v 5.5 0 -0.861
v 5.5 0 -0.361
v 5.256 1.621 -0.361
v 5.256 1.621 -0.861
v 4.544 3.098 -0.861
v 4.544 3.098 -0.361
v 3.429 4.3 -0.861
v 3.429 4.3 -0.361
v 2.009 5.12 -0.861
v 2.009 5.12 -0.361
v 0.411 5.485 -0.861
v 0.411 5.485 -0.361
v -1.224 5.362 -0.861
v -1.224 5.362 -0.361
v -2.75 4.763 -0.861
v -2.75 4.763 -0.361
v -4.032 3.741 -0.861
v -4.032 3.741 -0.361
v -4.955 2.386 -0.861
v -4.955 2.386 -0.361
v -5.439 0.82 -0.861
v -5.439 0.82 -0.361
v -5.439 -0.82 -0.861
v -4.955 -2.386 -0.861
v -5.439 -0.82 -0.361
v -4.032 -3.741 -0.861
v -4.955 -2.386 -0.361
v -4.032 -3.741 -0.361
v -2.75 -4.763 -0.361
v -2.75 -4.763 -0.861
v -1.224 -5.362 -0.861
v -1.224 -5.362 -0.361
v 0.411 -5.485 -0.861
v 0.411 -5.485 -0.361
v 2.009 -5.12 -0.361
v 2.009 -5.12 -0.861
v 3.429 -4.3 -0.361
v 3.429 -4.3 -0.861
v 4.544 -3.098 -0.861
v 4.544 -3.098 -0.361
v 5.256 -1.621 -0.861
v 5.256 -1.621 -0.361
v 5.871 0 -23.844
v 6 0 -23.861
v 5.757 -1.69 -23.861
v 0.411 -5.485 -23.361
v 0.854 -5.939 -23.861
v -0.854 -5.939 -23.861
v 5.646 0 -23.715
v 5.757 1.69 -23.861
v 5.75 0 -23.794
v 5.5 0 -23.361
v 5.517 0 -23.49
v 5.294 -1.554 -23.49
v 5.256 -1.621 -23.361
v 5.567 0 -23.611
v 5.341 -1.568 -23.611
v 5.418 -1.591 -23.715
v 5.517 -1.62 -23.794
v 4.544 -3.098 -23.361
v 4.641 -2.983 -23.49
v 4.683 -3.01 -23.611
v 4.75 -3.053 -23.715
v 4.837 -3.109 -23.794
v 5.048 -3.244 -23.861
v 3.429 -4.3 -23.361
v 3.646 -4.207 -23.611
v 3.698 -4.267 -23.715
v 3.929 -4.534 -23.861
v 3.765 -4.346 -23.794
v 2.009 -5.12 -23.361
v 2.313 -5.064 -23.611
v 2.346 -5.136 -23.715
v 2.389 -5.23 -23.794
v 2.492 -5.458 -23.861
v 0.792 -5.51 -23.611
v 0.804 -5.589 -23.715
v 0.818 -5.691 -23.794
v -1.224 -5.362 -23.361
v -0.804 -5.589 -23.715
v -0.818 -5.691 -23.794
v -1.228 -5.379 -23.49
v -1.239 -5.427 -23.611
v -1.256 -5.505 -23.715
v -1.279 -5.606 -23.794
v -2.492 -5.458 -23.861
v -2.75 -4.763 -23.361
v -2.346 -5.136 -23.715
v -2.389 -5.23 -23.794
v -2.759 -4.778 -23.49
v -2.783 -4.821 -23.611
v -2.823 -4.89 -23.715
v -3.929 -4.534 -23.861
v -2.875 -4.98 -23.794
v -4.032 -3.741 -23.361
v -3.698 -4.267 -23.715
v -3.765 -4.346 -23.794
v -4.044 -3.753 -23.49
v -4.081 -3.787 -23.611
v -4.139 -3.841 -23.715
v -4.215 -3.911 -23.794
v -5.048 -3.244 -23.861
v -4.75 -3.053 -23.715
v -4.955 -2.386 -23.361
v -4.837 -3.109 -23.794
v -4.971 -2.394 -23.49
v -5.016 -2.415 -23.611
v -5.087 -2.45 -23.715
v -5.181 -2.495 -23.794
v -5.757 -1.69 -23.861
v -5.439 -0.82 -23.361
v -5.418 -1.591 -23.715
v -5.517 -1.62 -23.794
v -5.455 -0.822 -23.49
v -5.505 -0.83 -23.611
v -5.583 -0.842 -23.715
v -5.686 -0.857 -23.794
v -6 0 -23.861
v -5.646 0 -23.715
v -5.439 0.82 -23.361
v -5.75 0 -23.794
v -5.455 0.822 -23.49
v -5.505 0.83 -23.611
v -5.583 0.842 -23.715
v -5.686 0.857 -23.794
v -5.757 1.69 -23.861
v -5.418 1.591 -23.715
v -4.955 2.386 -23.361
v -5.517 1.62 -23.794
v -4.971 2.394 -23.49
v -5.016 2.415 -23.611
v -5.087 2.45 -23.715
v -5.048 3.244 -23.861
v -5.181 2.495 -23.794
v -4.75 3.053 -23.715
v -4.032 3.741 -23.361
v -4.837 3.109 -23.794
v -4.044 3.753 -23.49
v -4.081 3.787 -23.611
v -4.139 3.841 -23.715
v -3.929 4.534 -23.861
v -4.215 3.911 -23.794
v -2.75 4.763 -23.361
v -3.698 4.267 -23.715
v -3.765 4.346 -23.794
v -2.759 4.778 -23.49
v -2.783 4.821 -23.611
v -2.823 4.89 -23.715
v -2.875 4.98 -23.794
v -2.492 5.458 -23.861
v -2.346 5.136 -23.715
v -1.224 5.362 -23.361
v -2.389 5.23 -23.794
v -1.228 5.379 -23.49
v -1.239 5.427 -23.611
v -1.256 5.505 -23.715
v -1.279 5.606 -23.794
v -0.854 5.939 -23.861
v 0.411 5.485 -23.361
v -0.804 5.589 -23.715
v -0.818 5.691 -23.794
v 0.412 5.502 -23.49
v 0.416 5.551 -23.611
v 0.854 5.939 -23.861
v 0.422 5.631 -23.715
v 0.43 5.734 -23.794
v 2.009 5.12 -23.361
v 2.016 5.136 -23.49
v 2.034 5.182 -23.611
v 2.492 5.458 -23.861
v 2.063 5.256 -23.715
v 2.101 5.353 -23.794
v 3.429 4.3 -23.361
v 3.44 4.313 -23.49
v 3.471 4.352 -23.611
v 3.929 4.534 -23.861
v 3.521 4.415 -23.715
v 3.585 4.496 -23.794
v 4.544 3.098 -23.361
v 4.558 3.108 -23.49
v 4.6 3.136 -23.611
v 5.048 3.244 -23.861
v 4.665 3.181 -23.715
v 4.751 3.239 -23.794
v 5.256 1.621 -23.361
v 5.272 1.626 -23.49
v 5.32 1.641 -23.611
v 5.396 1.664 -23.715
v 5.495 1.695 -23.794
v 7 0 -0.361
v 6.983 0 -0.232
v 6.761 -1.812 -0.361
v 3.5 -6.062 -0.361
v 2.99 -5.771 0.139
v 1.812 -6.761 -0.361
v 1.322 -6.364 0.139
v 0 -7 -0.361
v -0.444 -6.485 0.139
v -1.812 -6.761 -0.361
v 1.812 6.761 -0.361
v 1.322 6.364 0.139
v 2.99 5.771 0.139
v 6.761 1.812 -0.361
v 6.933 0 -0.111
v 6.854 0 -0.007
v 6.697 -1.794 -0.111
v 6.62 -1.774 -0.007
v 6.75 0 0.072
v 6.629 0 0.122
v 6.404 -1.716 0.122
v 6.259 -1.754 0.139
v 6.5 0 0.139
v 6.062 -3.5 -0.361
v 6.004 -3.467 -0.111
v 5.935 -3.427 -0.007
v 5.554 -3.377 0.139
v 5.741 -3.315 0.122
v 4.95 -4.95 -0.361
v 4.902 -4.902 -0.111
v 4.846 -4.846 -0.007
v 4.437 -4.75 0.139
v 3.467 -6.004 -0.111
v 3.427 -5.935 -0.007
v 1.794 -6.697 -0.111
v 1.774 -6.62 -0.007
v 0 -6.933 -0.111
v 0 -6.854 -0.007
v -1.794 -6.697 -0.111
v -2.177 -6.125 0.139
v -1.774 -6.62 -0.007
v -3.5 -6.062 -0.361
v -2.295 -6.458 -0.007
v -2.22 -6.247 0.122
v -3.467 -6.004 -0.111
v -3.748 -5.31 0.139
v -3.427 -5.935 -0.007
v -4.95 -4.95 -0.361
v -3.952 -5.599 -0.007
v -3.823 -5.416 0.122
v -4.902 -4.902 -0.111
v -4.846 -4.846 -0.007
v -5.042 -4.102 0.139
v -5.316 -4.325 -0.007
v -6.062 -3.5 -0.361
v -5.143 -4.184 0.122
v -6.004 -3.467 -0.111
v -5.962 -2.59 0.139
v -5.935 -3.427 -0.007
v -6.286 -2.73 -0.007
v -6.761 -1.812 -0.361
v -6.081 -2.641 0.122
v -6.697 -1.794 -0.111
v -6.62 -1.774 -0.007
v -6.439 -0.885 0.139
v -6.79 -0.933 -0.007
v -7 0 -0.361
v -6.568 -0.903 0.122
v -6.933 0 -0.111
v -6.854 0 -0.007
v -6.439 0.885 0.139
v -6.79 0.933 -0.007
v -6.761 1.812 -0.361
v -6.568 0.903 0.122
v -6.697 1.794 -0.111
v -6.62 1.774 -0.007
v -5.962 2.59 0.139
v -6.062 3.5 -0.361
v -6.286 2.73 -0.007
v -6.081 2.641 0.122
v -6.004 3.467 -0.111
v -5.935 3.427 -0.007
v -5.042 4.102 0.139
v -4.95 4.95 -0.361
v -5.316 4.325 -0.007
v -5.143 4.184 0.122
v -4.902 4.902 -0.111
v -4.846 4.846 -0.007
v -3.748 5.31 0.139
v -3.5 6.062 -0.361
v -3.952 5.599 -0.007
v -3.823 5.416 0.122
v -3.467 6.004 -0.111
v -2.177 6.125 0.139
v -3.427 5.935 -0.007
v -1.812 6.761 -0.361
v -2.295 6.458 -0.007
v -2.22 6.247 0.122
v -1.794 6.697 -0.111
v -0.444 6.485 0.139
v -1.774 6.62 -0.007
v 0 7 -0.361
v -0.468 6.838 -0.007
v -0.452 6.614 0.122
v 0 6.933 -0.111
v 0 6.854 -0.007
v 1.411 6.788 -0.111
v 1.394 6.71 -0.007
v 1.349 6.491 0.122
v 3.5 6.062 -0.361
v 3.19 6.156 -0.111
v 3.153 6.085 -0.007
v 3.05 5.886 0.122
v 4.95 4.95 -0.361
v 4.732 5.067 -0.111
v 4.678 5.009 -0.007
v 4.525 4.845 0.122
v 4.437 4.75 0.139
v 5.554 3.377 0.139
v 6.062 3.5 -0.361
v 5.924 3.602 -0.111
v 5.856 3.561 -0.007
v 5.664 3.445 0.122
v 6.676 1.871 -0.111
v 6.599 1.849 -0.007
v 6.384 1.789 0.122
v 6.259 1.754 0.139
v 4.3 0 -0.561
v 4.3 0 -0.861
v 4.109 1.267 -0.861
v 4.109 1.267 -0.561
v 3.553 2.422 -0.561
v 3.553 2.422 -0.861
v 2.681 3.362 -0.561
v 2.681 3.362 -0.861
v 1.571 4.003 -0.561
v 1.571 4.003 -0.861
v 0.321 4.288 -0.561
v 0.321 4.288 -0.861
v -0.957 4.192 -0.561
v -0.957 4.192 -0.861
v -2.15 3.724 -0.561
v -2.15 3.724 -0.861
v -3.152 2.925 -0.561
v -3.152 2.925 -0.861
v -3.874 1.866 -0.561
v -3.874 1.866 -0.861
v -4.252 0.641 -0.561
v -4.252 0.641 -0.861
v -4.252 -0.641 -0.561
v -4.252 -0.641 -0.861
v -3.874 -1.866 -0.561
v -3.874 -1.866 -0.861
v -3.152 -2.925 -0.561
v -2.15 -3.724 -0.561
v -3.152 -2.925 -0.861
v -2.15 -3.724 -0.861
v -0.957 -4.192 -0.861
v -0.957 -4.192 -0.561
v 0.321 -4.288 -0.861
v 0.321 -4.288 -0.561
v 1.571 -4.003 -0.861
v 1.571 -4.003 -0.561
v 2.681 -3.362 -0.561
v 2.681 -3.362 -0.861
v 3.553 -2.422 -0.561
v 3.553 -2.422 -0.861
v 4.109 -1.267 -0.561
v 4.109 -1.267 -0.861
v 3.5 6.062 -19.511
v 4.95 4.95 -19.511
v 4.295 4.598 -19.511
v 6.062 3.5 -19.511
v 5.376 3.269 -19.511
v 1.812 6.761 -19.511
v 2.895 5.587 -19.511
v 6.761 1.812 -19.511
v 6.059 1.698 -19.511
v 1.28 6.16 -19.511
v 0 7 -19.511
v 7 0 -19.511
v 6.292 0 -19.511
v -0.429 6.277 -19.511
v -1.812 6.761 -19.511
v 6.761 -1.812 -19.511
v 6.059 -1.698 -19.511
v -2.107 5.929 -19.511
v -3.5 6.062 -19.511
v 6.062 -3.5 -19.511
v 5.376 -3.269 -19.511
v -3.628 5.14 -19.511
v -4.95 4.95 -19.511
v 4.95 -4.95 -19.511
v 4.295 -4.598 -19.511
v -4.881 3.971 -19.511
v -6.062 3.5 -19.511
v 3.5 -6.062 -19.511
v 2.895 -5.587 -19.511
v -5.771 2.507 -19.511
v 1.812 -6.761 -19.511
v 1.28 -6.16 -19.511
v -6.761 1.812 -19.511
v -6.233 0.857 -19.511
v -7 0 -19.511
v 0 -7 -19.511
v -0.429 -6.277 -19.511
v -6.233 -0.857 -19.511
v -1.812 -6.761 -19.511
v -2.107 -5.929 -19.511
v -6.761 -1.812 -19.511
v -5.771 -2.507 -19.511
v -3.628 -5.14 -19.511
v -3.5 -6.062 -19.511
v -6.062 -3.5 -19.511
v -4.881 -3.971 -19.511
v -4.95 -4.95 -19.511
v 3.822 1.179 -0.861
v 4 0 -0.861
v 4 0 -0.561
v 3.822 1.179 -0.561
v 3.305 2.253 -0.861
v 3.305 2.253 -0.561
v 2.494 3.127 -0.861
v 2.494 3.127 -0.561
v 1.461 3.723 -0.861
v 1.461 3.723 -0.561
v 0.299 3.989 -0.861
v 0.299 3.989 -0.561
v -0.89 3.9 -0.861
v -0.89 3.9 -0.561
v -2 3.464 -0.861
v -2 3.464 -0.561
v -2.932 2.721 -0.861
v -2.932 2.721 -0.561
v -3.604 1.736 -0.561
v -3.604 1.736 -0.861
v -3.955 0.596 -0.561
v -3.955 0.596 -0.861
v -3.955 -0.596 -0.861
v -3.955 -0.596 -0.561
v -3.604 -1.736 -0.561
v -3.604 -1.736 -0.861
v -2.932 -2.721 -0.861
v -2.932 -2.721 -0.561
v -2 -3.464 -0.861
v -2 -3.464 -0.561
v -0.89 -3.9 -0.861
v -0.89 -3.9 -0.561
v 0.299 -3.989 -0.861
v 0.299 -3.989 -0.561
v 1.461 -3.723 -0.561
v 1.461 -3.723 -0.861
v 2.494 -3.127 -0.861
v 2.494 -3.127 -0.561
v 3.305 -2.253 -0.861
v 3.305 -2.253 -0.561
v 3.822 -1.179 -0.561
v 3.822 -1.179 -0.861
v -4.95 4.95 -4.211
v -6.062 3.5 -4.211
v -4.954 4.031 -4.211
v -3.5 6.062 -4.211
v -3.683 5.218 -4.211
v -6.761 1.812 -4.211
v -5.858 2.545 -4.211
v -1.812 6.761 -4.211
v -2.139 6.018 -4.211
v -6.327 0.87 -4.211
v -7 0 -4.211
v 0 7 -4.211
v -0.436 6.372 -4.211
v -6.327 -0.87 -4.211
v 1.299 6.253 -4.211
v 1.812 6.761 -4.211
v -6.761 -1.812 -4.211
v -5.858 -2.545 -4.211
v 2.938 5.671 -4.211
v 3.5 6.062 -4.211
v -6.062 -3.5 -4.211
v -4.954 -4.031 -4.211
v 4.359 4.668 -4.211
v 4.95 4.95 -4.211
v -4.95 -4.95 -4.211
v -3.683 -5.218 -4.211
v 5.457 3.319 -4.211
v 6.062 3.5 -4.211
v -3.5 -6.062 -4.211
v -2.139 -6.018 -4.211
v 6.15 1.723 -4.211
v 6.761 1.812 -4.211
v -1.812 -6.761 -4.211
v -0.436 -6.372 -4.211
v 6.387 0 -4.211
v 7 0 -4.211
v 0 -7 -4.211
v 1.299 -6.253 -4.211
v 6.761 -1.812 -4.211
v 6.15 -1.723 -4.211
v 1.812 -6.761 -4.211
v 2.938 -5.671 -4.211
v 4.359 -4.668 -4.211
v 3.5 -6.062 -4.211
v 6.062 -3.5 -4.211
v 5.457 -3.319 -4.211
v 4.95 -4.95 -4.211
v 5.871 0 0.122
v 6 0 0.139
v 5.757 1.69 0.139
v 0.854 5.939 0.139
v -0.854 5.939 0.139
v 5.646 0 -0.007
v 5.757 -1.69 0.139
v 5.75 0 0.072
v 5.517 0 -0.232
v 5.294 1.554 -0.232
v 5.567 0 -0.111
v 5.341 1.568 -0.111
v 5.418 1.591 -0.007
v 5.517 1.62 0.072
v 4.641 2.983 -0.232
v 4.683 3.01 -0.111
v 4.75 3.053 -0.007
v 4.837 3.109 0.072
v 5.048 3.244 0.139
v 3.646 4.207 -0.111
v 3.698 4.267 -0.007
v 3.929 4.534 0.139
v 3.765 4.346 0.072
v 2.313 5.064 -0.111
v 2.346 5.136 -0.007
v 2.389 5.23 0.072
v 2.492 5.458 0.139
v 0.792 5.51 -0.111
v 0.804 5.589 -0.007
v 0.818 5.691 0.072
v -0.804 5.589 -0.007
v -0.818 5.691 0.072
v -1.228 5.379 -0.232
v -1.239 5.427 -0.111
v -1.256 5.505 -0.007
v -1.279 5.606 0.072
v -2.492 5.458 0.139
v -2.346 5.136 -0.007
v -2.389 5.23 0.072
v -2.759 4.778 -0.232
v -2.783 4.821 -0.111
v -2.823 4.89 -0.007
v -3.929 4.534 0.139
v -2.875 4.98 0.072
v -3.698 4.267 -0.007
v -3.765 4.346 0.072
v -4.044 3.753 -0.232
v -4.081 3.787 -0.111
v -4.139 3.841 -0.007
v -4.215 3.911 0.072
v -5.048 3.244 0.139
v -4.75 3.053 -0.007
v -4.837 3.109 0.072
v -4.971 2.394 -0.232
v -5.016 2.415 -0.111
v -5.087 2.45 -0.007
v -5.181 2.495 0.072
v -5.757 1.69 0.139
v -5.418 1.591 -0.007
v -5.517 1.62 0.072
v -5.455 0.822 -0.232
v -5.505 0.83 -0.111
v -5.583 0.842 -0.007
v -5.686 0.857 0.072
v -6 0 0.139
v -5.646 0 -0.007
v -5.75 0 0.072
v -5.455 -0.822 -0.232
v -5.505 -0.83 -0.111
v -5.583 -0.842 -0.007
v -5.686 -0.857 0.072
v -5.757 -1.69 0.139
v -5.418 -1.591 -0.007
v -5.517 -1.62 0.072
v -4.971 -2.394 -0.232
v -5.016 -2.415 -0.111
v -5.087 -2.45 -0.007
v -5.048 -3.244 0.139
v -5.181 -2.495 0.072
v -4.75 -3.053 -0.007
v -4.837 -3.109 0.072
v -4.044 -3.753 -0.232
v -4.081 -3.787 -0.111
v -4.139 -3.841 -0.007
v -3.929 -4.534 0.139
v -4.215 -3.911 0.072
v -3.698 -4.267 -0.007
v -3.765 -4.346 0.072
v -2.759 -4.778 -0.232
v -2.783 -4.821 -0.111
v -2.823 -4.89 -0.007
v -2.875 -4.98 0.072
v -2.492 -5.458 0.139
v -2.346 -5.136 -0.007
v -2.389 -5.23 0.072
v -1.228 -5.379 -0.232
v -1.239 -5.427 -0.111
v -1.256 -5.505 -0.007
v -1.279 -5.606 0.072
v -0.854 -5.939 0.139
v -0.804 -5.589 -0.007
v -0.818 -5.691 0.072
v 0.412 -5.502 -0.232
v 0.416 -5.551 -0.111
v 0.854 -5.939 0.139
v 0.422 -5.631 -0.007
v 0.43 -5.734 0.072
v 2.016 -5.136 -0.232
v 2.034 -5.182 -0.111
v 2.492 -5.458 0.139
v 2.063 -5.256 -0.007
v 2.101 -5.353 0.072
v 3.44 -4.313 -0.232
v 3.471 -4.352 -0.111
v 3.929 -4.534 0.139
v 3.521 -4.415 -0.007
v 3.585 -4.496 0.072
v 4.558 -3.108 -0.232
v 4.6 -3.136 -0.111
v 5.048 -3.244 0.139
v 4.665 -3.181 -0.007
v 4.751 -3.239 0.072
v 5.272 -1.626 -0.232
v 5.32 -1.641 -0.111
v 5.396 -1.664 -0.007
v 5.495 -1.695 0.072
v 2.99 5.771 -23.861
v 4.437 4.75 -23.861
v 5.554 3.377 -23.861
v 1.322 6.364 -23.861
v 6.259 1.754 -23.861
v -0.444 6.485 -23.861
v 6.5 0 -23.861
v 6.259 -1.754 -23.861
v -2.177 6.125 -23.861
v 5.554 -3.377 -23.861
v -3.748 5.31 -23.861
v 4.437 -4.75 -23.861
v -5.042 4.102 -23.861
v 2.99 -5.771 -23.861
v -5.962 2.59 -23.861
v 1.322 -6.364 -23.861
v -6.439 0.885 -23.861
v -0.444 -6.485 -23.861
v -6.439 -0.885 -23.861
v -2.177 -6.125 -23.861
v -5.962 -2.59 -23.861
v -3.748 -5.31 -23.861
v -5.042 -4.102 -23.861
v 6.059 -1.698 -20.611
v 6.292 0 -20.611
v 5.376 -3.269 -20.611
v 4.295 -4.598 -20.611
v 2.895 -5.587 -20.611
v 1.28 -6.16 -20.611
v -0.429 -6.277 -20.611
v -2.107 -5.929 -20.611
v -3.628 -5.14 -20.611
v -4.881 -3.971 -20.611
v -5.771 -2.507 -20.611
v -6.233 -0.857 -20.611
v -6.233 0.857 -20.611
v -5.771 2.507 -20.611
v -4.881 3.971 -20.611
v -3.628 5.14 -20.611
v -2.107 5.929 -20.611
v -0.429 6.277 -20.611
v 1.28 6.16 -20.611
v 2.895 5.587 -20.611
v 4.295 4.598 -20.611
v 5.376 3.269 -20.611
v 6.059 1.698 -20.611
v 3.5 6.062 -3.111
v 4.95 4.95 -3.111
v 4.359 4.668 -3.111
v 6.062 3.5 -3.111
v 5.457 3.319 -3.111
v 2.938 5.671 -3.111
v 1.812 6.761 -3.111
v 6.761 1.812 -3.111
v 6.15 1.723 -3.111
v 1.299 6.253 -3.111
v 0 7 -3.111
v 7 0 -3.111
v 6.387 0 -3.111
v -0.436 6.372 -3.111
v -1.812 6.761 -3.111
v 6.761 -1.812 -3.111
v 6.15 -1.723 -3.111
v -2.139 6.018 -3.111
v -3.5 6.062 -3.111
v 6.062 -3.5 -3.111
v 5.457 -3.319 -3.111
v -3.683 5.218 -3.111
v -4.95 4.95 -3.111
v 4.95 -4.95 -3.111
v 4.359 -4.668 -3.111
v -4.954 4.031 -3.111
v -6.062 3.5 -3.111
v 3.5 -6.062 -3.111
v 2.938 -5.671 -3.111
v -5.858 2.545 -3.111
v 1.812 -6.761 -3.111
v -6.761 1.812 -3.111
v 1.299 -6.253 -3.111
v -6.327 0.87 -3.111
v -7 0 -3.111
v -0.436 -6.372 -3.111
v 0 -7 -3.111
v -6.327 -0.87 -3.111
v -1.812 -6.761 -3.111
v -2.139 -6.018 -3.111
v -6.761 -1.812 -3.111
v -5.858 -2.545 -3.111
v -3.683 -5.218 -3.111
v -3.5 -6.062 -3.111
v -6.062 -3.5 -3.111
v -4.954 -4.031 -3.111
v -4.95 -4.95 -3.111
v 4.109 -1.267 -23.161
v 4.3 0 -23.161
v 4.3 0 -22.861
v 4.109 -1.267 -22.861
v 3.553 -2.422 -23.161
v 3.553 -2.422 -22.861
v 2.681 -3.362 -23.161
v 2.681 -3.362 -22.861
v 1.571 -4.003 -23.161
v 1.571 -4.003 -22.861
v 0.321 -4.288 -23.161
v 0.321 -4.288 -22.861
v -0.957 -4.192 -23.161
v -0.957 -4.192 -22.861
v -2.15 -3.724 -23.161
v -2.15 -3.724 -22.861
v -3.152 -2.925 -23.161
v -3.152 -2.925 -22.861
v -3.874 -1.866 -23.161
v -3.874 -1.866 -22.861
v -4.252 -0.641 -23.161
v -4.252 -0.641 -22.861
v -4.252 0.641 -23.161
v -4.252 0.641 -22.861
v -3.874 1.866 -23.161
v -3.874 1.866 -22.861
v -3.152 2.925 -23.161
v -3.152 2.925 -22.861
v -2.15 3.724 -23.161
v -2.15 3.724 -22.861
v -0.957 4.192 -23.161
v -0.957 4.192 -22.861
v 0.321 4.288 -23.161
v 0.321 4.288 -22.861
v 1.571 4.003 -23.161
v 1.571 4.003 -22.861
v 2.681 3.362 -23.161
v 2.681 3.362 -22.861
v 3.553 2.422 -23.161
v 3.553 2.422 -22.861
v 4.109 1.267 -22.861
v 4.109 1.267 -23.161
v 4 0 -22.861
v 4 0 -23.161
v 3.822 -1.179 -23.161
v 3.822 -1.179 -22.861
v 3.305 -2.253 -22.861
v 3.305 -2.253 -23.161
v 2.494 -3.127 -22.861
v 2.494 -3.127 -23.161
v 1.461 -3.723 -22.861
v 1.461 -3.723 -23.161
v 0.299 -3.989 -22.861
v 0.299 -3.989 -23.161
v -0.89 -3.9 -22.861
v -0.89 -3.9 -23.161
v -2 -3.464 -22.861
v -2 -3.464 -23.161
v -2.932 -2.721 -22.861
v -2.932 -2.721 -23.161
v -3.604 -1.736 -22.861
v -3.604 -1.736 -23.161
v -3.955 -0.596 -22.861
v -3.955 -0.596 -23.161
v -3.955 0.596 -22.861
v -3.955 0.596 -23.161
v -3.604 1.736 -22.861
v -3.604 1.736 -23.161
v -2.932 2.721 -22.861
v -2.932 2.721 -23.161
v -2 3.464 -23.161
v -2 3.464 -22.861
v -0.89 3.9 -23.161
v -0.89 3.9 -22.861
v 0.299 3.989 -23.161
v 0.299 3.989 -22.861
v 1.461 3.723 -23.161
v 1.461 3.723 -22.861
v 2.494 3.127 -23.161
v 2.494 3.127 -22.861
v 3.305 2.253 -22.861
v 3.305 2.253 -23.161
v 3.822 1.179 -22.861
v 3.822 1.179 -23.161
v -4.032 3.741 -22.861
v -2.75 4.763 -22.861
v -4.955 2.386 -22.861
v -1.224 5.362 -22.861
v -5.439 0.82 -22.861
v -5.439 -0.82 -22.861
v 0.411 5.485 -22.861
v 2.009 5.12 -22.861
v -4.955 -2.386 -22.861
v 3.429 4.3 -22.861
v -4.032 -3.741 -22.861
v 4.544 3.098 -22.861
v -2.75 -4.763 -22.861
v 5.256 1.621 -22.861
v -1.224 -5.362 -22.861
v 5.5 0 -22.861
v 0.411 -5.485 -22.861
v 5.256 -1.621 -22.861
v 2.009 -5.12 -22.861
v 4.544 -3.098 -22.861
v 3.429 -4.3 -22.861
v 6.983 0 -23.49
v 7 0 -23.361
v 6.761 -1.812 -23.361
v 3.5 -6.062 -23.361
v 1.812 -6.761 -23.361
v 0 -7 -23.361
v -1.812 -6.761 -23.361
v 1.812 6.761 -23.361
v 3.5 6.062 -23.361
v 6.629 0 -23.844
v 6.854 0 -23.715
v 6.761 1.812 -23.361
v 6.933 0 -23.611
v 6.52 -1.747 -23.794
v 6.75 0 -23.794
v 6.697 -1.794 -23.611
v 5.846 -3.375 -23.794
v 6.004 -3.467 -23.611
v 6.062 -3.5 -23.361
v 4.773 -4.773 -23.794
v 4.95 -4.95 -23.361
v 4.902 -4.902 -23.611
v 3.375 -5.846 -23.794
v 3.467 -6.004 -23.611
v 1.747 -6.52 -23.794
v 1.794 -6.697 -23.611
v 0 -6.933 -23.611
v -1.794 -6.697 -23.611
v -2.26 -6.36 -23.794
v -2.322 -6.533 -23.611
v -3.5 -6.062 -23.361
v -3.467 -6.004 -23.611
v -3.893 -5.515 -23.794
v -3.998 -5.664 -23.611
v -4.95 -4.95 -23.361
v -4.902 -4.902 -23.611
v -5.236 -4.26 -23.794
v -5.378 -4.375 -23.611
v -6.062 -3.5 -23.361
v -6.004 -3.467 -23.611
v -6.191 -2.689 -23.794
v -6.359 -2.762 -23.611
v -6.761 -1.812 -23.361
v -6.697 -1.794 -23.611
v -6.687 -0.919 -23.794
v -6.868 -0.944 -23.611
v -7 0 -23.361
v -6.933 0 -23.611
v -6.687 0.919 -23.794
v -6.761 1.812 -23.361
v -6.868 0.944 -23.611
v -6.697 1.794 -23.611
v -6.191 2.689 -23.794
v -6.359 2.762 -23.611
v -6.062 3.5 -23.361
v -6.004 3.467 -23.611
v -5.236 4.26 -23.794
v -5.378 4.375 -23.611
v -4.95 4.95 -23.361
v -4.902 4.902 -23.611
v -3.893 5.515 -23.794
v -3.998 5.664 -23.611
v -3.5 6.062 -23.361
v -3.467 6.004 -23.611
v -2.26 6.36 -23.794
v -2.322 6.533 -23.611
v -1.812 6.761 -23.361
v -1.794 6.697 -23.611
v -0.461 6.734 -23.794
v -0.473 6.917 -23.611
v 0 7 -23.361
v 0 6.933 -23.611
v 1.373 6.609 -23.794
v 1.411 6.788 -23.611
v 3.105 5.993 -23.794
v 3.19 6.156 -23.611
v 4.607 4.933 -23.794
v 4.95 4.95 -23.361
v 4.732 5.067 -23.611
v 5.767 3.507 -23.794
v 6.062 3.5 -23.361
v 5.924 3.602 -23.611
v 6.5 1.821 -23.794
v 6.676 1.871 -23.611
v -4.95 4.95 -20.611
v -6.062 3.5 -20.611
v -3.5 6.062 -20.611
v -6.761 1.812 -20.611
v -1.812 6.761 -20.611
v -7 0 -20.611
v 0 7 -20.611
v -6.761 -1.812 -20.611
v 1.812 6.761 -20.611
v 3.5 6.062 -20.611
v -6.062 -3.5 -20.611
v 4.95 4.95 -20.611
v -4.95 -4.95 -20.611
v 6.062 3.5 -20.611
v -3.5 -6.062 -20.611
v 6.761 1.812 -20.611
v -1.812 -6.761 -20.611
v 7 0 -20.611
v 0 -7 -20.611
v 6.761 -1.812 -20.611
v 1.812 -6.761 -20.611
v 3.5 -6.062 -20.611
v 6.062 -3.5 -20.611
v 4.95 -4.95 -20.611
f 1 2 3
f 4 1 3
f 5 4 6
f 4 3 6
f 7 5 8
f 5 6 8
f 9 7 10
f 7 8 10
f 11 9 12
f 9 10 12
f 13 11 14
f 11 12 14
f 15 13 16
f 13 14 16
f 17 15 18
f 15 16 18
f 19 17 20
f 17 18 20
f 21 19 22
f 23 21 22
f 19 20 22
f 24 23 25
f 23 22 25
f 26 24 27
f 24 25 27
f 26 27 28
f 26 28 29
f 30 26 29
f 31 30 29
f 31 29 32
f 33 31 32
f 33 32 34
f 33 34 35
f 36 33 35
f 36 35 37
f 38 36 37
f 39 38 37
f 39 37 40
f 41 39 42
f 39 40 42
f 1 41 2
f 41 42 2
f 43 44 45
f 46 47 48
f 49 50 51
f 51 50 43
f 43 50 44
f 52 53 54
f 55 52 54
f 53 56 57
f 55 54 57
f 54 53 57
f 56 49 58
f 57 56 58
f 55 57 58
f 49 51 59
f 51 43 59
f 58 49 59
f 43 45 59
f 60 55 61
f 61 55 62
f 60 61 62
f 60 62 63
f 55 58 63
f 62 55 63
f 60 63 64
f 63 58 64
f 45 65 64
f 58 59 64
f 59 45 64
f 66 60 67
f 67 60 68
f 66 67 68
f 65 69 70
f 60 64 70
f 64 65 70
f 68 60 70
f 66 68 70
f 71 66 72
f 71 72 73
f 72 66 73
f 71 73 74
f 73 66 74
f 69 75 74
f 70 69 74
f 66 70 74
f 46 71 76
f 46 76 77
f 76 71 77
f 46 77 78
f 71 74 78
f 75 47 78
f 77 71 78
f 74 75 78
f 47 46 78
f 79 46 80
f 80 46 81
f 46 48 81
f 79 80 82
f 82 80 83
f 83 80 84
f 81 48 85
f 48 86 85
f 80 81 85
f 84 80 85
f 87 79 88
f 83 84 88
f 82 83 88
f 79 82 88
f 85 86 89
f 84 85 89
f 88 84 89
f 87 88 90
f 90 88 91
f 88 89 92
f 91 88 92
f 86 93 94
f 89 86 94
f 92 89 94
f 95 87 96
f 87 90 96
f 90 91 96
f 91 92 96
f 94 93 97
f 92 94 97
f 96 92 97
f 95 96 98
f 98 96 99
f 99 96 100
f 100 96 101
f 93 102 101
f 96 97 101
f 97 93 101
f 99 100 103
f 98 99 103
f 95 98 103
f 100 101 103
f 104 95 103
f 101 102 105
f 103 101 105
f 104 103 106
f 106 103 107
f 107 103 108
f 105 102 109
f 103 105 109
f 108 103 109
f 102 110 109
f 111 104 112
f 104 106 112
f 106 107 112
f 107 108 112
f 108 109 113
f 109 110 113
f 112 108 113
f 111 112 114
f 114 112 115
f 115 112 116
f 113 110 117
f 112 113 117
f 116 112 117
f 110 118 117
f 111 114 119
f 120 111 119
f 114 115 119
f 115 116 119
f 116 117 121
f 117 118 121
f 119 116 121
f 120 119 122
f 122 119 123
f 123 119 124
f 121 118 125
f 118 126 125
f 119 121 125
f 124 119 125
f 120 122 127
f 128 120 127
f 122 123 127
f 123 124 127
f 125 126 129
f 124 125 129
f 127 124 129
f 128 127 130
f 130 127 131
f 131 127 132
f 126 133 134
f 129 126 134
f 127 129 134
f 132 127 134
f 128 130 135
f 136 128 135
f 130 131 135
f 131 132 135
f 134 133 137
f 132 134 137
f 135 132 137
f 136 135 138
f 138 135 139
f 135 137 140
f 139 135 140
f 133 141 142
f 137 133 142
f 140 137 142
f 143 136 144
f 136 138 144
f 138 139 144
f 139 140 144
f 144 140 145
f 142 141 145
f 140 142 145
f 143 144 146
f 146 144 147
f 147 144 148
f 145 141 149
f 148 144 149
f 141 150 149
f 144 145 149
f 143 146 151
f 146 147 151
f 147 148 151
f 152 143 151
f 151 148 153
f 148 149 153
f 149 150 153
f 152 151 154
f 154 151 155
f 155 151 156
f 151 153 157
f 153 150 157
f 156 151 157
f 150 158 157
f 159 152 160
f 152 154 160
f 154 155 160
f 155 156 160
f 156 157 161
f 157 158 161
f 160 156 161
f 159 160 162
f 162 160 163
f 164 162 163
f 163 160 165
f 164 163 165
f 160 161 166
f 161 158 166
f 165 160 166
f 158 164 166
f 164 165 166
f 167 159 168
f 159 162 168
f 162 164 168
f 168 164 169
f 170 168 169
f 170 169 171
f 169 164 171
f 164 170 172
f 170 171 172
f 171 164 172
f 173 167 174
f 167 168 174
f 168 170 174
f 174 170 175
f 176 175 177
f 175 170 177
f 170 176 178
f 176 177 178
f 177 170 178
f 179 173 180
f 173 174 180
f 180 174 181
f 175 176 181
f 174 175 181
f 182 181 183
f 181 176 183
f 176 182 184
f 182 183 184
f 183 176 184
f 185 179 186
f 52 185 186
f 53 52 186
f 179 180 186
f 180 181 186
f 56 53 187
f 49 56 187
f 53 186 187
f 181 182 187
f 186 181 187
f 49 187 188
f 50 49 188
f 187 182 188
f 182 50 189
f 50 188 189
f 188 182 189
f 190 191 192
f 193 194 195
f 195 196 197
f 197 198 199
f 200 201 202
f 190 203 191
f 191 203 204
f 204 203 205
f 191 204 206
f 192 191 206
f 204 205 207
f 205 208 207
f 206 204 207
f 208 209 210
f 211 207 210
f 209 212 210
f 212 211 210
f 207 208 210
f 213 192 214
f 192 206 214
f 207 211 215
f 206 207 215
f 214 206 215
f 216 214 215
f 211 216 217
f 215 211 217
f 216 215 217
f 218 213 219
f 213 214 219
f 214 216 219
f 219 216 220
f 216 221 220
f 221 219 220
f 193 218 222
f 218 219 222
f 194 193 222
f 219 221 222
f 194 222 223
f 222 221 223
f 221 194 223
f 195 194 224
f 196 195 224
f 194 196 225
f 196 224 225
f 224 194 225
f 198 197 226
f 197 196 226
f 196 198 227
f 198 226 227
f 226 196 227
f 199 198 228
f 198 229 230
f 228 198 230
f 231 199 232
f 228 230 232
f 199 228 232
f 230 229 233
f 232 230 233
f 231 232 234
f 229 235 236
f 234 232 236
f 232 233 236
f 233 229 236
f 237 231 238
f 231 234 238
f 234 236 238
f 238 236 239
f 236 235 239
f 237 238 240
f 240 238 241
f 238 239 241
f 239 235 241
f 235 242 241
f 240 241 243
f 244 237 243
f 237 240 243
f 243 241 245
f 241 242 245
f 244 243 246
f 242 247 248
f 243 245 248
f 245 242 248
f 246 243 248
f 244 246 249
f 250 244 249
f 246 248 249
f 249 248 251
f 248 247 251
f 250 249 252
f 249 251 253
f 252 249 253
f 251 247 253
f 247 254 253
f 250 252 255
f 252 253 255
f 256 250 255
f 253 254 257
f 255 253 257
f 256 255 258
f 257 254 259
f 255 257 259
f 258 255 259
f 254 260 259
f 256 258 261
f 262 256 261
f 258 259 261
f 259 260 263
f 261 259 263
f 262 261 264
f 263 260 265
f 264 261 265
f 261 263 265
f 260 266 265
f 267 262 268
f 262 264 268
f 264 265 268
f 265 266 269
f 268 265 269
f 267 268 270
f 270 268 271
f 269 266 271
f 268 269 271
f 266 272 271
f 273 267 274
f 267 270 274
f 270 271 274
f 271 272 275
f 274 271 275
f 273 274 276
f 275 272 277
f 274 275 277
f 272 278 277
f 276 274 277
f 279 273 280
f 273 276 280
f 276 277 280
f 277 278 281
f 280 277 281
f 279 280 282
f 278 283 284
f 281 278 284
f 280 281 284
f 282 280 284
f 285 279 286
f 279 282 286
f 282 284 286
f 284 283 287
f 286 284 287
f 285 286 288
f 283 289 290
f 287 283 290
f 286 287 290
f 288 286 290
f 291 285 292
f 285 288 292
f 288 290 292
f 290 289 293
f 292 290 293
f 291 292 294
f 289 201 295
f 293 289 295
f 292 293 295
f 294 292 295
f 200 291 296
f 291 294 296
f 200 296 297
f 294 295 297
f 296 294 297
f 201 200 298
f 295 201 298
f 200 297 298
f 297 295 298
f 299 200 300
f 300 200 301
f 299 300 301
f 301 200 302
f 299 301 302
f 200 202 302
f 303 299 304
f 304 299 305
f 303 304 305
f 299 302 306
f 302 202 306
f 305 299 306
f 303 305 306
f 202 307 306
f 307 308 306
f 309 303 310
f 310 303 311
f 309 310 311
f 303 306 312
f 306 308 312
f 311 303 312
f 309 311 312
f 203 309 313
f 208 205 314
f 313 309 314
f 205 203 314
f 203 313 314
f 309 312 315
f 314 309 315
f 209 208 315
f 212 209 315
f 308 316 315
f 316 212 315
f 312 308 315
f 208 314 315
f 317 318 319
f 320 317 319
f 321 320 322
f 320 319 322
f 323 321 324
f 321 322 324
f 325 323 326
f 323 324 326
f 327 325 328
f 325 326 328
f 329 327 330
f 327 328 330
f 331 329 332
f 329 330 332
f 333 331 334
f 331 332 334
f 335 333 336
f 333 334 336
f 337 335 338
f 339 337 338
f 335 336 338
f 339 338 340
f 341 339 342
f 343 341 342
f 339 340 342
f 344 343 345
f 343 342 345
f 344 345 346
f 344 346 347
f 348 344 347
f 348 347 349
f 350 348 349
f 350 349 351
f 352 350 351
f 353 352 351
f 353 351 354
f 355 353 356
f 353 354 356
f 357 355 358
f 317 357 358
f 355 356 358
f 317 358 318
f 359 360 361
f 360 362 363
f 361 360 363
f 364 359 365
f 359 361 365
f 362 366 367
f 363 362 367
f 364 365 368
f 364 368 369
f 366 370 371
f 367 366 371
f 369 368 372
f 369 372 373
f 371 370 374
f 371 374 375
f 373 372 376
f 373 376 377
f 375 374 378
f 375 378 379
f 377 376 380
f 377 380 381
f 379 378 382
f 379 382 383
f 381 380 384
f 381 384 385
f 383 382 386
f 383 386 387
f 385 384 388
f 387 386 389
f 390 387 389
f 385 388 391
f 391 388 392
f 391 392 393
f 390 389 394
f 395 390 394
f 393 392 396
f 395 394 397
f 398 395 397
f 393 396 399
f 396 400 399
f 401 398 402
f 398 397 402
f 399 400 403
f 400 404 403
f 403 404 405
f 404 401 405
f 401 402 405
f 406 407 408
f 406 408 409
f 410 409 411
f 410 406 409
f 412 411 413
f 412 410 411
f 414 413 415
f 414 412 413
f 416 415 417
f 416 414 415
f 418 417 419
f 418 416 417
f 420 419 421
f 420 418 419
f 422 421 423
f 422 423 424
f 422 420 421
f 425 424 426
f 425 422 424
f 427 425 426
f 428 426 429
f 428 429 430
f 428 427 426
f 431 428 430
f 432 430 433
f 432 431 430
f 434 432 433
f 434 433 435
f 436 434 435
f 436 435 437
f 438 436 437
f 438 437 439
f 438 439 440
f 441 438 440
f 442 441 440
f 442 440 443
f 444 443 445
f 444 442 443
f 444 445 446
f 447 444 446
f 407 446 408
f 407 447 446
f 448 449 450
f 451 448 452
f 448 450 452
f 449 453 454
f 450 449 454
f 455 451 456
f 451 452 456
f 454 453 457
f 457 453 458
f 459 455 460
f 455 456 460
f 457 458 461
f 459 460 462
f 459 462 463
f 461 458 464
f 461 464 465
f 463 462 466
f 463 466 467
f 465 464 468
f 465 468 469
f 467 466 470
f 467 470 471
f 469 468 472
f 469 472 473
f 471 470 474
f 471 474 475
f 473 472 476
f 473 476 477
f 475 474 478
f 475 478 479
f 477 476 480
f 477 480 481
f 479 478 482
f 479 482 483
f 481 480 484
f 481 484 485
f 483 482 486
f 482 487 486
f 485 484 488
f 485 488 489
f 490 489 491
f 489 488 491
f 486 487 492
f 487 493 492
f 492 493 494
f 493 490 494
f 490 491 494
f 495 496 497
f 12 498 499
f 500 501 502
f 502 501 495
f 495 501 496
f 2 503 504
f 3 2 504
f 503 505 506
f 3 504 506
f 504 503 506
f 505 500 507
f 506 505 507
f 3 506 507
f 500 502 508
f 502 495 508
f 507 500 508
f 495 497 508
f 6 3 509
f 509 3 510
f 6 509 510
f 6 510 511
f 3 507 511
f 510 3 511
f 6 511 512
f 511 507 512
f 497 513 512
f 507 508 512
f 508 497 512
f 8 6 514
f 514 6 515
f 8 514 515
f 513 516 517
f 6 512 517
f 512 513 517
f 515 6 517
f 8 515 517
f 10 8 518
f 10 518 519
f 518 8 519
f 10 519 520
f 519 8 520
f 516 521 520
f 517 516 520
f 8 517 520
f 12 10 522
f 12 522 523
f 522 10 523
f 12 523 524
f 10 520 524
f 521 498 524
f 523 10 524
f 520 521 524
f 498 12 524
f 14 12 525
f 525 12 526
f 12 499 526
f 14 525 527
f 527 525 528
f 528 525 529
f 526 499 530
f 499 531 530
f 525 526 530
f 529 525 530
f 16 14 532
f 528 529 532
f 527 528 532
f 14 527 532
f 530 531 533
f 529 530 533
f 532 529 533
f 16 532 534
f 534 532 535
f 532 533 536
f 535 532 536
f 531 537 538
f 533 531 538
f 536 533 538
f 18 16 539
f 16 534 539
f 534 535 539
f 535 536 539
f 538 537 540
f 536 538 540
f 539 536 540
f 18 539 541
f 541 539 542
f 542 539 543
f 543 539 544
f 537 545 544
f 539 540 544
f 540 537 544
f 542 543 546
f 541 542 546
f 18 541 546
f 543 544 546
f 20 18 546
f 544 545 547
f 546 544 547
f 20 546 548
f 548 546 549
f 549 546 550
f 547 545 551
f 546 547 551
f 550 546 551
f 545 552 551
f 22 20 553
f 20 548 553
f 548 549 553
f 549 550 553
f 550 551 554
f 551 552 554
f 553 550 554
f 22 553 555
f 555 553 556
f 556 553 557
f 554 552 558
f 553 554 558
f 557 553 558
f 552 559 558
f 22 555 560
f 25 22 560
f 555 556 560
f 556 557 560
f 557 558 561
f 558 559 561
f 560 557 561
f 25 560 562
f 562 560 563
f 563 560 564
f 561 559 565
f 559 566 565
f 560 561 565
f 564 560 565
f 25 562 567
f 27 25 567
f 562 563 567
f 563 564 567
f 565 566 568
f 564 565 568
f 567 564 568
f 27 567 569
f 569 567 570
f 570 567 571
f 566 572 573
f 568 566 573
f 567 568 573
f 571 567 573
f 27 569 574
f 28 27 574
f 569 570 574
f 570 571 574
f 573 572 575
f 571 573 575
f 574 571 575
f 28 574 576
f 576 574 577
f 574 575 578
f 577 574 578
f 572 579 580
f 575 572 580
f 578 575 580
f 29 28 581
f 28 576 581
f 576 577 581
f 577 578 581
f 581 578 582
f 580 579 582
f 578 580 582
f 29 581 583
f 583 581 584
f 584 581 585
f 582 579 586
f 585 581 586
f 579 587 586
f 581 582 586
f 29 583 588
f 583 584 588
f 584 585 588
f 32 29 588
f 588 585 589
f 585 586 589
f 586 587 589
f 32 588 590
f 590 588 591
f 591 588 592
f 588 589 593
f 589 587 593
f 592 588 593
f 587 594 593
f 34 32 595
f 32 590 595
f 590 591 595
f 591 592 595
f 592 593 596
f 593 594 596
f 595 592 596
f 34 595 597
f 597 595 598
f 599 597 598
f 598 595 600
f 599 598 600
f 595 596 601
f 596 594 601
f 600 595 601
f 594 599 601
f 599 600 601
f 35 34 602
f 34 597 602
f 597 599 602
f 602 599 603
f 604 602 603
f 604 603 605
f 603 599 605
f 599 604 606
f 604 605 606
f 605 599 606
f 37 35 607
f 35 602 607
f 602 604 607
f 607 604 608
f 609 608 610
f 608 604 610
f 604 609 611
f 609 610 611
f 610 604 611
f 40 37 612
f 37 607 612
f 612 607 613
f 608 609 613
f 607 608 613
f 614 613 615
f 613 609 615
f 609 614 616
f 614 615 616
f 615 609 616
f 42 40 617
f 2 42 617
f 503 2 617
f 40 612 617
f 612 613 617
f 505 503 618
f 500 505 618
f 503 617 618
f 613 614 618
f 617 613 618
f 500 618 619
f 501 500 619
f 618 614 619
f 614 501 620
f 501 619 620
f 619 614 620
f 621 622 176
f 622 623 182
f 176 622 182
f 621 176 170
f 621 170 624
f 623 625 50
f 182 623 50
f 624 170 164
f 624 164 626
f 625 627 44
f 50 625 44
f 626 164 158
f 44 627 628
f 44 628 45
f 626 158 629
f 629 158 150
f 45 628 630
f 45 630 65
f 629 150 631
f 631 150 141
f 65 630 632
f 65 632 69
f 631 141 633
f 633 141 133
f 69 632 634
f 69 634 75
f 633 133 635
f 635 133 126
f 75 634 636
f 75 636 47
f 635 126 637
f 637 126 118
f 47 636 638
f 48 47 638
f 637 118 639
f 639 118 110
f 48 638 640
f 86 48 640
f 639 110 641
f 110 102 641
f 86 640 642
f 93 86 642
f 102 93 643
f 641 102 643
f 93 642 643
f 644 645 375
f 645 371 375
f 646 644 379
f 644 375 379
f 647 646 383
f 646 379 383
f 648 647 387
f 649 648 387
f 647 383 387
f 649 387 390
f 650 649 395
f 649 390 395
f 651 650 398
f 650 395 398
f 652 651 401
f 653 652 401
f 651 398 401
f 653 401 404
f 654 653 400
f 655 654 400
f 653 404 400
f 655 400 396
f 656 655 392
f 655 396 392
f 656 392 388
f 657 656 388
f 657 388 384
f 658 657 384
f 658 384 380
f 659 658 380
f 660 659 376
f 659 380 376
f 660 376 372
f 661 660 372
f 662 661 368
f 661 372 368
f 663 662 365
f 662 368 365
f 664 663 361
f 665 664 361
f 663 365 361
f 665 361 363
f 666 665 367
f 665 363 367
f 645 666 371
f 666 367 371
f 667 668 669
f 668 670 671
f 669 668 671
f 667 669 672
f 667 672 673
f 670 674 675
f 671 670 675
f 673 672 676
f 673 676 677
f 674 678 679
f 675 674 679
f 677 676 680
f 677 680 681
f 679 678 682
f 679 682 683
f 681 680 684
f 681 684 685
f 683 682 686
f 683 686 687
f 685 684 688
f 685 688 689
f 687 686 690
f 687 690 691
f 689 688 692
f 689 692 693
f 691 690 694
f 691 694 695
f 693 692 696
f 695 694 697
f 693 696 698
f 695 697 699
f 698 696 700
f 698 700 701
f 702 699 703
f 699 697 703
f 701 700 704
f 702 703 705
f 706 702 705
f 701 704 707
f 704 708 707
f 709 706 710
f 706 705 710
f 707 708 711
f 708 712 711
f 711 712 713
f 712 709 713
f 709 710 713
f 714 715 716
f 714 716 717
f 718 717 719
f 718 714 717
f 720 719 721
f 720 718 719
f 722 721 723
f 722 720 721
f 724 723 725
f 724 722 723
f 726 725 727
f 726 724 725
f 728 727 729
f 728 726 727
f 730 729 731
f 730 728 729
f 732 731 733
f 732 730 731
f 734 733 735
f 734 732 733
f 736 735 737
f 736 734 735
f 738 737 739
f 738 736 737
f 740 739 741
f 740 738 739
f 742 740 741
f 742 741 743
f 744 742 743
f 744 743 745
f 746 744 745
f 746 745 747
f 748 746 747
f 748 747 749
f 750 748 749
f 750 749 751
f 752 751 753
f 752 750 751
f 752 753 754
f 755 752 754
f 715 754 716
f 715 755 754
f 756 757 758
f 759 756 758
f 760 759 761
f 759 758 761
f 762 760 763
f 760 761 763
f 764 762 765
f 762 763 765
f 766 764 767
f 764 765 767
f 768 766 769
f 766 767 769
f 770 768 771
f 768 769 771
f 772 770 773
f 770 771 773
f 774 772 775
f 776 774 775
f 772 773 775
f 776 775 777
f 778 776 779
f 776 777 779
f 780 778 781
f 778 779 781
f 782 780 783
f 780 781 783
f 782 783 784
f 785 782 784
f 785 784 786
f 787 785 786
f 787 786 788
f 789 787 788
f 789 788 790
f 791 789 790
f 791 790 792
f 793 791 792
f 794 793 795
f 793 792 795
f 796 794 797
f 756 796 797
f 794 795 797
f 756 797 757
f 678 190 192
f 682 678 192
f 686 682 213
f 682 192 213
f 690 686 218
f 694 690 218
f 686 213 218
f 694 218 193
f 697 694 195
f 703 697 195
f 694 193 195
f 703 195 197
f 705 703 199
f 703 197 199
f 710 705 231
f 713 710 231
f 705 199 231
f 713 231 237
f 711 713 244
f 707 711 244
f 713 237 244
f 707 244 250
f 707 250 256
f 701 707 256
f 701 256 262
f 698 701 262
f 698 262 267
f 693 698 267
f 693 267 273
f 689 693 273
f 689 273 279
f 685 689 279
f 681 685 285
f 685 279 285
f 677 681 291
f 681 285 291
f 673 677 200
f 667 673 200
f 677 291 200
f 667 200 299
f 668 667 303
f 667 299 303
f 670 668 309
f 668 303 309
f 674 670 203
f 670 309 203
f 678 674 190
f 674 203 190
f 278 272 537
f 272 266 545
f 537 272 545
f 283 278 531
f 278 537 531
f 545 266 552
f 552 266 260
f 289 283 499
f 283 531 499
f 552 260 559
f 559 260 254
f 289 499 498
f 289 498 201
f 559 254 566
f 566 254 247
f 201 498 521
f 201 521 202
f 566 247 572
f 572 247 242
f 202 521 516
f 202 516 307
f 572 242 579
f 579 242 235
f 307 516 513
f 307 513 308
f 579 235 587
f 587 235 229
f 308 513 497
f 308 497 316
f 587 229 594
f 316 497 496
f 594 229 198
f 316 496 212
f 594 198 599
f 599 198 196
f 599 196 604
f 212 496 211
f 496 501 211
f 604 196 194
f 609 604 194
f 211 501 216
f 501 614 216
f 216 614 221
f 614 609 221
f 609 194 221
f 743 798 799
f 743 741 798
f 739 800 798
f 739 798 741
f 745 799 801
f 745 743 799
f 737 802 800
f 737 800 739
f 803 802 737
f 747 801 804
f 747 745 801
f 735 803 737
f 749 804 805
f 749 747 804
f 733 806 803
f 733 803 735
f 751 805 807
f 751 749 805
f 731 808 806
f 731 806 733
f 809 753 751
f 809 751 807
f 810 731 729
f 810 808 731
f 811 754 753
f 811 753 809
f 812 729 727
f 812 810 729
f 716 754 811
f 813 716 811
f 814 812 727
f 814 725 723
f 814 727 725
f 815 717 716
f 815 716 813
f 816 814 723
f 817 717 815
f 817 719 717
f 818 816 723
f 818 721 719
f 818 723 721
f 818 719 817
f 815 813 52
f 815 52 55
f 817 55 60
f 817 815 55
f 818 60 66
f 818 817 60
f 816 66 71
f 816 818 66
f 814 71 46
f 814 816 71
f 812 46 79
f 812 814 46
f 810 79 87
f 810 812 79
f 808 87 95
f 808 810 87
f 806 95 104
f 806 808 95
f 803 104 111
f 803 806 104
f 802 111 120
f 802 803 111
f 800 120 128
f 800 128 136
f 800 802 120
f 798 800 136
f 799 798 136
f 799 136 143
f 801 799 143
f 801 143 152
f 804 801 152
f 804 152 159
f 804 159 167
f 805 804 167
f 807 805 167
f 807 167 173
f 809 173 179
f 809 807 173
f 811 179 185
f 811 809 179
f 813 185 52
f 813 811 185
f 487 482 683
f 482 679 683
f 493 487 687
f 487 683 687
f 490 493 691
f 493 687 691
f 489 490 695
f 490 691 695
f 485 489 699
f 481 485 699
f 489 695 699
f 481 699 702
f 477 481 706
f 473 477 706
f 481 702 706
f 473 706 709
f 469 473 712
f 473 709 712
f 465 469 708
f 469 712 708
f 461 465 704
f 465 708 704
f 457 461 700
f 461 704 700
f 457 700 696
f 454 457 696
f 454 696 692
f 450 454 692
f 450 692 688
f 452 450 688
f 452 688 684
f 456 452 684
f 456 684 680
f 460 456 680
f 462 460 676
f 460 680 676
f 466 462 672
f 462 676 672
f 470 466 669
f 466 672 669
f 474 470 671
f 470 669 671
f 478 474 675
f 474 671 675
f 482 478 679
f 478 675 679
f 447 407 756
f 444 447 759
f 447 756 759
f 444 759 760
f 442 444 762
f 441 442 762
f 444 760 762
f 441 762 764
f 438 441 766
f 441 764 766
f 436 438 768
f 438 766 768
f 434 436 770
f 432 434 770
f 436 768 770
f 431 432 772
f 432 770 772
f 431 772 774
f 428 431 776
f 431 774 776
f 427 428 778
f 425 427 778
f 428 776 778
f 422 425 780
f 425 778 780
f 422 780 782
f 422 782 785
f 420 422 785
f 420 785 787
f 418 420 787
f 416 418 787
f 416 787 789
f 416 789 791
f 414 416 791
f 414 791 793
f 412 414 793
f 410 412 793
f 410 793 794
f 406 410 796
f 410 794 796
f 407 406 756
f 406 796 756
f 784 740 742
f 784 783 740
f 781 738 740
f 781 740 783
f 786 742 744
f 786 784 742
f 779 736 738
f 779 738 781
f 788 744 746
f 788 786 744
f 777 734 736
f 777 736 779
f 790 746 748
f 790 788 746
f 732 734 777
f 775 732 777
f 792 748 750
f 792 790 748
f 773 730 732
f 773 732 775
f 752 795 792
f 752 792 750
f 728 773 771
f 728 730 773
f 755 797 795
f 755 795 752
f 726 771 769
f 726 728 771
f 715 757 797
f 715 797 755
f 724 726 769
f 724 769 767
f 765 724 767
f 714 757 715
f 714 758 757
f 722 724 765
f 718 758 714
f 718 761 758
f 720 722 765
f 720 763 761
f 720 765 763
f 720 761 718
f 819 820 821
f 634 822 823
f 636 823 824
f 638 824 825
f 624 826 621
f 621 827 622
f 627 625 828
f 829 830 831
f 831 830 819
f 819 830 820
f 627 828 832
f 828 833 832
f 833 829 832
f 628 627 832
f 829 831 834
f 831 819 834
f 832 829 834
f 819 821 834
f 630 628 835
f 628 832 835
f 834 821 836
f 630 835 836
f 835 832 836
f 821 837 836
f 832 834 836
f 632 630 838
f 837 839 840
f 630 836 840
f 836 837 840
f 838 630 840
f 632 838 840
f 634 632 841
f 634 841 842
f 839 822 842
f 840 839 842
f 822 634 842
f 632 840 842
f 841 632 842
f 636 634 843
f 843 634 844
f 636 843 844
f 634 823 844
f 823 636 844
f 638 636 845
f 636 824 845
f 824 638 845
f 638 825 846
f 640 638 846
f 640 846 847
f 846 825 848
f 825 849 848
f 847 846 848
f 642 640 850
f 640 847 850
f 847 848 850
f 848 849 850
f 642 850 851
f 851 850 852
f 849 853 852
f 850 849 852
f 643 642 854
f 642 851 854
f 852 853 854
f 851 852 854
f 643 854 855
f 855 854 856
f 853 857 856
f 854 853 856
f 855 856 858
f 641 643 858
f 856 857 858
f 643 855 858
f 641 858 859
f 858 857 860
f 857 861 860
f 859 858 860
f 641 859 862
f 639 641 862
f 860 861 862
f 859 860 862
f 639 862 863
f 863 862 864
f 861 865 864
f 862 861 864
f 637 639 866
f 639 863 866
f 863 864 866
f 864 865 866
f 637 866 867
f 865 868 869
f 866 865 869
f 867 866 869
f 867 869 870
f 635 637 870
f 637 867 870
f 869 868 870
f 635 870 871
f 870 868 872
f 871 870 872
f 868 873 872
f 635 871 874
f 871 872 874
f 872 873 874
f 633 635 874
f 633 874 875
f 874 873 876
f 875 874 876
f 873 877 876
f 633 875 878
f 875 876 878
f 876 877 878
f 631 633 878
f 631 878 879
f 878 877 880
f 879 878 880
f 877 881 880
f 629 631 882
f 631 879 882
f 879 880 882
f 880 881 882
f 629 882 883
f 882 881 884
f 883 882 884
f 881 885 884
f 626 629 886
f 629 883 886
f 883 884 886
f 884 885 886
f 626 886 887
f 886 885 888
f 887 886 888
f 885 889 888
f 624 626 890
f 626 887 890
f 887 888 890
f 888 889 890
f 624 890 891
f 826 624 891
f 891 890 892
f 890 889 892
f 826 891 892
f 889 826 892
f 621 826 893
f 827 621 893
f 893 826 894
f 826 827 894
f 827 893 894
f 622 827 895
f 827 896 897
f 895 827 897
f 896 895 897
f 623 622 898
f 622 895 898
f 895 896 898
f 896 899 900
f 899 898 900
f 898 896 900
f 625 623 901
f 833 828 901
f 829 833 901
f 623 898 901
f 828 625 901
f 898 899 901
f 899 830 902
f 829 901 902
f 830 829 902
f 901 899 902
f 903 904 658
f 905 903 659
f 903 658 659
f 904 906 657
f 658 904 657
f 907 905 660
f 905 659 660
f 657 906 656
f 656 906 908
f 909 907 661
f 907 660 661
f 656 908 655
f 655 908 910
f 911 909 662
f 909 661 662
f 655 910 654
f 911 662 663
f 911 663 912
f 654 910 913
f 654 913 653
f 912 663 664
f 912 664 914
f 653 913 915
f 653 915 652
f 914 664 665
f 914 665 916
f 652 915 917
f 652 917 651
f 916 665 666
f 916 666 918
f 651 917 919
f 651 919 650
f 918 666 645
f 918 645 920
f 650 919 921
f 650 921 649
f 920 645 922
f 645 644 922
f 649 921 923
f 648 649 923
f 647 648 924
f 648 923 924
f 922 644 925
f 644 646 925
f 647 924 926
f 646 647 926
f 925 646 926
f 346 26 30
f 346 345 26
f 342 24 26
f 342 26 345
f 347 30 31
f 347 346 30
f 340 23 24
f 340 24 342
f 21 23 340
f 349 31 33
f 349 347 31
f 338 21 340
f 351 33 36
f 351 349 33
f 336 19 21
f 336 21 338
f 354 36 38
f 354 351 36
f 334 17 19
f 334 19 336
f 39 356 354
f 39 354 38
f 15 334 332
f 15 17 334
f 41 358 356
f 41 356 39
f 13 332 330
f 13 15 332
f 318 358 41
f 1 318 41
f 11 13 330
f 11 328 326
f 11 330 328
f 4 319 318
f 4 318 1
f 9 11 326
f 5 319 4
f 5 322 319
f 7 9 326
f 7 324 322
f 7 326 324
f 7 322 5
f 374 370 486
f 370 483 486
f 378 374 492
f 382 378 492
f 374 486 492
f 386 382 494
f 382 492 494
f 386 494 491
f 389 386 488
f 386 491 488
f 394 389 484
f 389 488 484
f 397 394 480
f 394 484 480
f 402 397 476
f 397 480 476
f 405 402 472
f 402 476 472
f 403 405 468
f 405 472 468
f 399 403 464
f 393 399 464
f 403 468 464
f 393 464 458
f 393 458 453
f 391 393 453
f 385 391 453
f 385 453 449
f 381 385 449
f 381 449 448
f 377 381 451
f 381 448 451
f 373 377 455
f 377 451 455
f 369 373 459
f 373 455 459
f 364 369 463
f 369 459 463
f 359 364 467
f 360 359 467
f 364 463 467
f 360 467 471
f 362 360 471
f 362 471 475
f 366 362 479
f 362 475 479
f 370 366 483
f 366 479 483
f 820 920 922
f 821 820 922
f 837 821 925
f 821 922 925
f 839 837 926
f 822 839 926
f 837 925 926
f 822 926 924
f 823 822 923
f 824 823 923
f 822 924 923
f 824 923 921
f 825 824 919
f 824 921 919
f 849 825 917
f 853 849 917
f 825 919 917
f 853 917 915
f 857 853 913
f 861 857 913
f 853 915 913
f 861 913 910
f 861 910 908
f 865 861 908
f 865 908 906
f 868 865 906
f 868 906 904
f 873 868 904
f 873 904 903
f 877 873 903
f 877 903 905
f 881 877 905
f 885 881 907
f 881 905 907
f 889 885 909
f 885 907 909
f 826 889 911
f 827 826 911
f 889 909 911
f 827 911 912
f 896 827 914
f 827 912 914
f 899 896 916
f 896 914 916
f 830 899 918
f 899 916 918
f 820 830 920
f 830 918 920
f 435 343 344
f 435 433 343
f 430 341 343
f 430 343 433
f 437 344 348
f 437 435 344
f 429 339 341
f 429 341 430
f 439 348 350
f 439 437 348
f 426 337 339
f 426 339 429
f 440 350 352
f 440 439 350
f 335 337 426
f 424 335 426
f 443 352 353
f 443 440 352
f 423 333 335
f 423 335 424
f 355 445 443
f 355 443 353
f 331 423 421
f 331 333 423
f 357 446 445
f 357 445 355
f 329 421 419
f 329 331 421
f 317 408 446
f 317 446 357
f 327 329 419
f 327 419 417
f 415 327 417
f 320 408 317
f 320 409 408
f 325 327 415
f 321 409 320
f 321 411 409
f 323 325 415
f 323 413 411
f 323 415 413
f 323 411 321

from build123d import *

# Parameters (mm, degrees)
FILLET1_R           = 0.5
SKETCH5_R           = 5.5
CUT_EXTRUDE1_DEPTH  = 1
FILLET2_R           = 0.5
CUT_EXTRUDE2_START  = -1
SKETCH6_R           = 5.5
CUT_EXTRUDE2_DEPTH  = 1
FILLET3_R           = 0.5
SKETCH8_R           = 4.3
SKETCH8_R_2         = 4
BOSS_EXTRUDE4_DEPTH = 0.3
BOSS_EXTRUDE5_START = 0.3
SKETCH9_R           = 4.3
SKETCH9_R_2         = 4
BOSS_EXTRUDE5_DEPTH = 0.3


with BuildPart() as part:
    # Sketch4 → Revolve1 (revolve)
    with BuildSketch(Plane(origin=(0, 0, 0), x_dir=(0, 0, -1), z_dir=(1, 0, 0)), mode=Mode.PRIVATE) as revolve1_sk:
        Polygon((-0.139006256, 4), (23.860993744, 4), (23.860993744, 7), (20.610993744, 7), (20.610993744, 6.291984931), (19.510993744, 6.291984931), (19.510993744, 7), (4.210993744, 7), (4.210993744, 6.386905477), (3.110993744, 6.386905477), (3.110993744, 7), (-0.139006256, 7), align=None)
    revolve(revolve1_sk.sketch.rotate(Axis((0, 0, 0), (0, 0, -1)), 90), axis=Axis((0, 0, 0), (0, 0, -1)))

    # Fillet1
    fillet1_edges = [part.edges().sort_by_distance(p)[0] for p in [
        (-7, 0, -23.860993744),
        (-7, 0, 0.139006256),
    ]]
    fillet(fillet1_edges, radius=FILLET1_R)

    # Sketch5 → Cut-Extrude1 (cut)
    with BuildSketch(Plane.XY.offset(0.139006256)):
        Circle(SKETCH5_R)
    extrude(amount=-CUT_EXTRUDE1_DEPTH, mode=Mode.SUBTRACT)

    # Fillet2
    fillet2_edges = [part.edges().sort_by_distance(p)[0] for p in [
        (-5.5, 0, 0.139006256),
    ]]
    fillet(fillet2_edges, radius=FILLET2_R)

    # Sketch6 → Cut-Extrude2 (cut)
    with BuildSketch(Plane(origin=(0, 0, -23.860993744), x_dir=(-1, 0, 0), z_dir=(0, 0, -1)).offset(CUT_EXTRUDE2_START)):
        with Locations(Location((0, 0, 0), (0, 0, 180))):
            Circle(SKETCH6_R)
    extrude(amount=CUT_EXTRUDE2_DEPTH, mode=Mode.SUBTRACT)

    # Fillet3
    fillet3_edges = [part.edges().sort_by_distance(p)[0] for p in [
        (-5.5, 0, -23.860993744),
    ]]
    fillet(fillet3_edges, radius=FILLET3_R)

    # Sketch8 → Boss-Extrude4 (add)
    with BuildSketch(Plane.XY.offset(-0.860993744)):
        Circle(SKETCH8_R)
        Circle(SKETCH8_R_2, mode=Mode.SUBTRACT)
    extrude(amount=BOSS_EXTRUDE4_DEPTH)

    # Sketch9 → Boss-Extrude5 (add)
    with BuildSketch(Plane(origin=(0, 0, -22.860993744), x_dir=(-1, 0, 0), z_dir=(0, 0, -1)).offset(BOSS_EXTRUDE5_START)):
        with Locations(Location((0, 0, 0), (0, 0, 180))):
            Circle(SKETCH9_R)
        with Locations(Location((0, 0, 0), (0, 0, 180))):
            Circle(SKETCH9_R_2, mode=Mode.SUBTRACT)
    extrude(amount=-BOSS_EXTRUDE5_DEPTH)


solid = part.part
